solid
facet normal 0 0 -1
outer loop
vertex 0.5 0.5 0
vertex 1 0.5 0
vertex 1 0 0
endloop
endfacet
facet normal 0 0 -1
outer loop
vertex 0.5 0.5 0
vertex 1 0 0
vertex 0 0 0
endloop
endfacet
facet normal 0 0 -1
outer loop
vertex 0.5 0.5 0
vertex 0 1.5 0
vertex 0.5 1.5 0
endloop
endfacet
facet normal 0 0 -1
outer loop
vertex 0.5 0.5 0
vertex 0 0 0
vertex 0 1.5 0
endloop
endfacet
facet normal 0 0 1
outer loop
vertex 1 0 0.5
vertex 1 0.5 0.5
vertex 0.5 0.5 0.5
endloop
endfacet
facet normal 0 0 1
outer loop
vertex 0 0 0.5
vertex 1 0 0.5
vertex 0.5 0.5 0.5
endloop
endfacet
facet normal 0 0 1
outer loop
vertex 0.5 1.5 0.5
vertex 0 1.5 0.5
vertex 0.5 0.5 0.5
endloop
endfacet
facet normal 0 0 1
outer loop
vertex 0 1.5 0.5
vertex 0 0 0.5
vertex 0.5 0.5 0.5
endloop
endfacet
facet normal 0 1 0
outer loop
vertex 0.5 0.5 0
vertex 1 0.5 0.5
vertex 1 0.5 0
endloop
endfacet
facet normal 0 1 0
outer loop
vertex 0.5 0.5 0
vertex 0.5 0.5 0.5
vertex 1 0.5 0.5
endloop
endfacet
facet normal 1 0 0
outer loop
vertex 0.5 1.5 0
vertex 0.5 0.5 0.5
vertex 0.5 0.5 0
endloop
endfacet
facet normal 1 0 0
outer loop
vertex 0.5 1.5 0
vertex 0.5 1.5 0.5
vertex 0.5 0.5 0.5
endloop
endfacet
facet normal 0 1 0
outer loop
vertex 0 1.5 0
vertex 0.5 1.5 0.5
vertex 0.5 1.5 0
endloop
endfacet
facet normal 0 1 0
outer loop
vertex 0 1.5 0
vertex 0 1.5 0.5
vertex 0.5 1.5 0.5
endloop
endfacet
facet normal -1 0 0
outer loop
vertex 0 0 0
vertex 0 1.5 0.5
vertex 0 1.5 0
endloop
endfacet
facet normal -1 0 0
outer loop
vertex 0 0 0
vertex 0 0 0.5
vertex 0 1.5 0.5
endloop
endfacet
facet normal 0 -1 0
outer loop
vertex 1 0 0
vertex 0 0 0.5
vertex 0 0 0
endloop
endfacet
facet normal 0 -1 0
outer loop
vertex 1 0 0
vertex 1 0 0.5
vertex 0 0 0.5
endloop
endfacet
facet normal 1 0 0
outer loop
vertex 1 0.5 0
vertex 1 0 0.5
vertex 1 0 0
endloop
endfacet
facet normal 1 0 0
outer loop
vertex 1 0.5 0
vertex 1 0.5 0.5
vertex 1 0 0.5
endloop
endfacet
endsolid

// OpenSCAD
// Tetromino (L) for Stacks of Shapes
// by Slashee the Cow
linear_extrude(0.5)
polygon([[0,0],[1,0],[1,0.5],[0.5,0.5],[0.5,1.5],[0,1.5]]);
